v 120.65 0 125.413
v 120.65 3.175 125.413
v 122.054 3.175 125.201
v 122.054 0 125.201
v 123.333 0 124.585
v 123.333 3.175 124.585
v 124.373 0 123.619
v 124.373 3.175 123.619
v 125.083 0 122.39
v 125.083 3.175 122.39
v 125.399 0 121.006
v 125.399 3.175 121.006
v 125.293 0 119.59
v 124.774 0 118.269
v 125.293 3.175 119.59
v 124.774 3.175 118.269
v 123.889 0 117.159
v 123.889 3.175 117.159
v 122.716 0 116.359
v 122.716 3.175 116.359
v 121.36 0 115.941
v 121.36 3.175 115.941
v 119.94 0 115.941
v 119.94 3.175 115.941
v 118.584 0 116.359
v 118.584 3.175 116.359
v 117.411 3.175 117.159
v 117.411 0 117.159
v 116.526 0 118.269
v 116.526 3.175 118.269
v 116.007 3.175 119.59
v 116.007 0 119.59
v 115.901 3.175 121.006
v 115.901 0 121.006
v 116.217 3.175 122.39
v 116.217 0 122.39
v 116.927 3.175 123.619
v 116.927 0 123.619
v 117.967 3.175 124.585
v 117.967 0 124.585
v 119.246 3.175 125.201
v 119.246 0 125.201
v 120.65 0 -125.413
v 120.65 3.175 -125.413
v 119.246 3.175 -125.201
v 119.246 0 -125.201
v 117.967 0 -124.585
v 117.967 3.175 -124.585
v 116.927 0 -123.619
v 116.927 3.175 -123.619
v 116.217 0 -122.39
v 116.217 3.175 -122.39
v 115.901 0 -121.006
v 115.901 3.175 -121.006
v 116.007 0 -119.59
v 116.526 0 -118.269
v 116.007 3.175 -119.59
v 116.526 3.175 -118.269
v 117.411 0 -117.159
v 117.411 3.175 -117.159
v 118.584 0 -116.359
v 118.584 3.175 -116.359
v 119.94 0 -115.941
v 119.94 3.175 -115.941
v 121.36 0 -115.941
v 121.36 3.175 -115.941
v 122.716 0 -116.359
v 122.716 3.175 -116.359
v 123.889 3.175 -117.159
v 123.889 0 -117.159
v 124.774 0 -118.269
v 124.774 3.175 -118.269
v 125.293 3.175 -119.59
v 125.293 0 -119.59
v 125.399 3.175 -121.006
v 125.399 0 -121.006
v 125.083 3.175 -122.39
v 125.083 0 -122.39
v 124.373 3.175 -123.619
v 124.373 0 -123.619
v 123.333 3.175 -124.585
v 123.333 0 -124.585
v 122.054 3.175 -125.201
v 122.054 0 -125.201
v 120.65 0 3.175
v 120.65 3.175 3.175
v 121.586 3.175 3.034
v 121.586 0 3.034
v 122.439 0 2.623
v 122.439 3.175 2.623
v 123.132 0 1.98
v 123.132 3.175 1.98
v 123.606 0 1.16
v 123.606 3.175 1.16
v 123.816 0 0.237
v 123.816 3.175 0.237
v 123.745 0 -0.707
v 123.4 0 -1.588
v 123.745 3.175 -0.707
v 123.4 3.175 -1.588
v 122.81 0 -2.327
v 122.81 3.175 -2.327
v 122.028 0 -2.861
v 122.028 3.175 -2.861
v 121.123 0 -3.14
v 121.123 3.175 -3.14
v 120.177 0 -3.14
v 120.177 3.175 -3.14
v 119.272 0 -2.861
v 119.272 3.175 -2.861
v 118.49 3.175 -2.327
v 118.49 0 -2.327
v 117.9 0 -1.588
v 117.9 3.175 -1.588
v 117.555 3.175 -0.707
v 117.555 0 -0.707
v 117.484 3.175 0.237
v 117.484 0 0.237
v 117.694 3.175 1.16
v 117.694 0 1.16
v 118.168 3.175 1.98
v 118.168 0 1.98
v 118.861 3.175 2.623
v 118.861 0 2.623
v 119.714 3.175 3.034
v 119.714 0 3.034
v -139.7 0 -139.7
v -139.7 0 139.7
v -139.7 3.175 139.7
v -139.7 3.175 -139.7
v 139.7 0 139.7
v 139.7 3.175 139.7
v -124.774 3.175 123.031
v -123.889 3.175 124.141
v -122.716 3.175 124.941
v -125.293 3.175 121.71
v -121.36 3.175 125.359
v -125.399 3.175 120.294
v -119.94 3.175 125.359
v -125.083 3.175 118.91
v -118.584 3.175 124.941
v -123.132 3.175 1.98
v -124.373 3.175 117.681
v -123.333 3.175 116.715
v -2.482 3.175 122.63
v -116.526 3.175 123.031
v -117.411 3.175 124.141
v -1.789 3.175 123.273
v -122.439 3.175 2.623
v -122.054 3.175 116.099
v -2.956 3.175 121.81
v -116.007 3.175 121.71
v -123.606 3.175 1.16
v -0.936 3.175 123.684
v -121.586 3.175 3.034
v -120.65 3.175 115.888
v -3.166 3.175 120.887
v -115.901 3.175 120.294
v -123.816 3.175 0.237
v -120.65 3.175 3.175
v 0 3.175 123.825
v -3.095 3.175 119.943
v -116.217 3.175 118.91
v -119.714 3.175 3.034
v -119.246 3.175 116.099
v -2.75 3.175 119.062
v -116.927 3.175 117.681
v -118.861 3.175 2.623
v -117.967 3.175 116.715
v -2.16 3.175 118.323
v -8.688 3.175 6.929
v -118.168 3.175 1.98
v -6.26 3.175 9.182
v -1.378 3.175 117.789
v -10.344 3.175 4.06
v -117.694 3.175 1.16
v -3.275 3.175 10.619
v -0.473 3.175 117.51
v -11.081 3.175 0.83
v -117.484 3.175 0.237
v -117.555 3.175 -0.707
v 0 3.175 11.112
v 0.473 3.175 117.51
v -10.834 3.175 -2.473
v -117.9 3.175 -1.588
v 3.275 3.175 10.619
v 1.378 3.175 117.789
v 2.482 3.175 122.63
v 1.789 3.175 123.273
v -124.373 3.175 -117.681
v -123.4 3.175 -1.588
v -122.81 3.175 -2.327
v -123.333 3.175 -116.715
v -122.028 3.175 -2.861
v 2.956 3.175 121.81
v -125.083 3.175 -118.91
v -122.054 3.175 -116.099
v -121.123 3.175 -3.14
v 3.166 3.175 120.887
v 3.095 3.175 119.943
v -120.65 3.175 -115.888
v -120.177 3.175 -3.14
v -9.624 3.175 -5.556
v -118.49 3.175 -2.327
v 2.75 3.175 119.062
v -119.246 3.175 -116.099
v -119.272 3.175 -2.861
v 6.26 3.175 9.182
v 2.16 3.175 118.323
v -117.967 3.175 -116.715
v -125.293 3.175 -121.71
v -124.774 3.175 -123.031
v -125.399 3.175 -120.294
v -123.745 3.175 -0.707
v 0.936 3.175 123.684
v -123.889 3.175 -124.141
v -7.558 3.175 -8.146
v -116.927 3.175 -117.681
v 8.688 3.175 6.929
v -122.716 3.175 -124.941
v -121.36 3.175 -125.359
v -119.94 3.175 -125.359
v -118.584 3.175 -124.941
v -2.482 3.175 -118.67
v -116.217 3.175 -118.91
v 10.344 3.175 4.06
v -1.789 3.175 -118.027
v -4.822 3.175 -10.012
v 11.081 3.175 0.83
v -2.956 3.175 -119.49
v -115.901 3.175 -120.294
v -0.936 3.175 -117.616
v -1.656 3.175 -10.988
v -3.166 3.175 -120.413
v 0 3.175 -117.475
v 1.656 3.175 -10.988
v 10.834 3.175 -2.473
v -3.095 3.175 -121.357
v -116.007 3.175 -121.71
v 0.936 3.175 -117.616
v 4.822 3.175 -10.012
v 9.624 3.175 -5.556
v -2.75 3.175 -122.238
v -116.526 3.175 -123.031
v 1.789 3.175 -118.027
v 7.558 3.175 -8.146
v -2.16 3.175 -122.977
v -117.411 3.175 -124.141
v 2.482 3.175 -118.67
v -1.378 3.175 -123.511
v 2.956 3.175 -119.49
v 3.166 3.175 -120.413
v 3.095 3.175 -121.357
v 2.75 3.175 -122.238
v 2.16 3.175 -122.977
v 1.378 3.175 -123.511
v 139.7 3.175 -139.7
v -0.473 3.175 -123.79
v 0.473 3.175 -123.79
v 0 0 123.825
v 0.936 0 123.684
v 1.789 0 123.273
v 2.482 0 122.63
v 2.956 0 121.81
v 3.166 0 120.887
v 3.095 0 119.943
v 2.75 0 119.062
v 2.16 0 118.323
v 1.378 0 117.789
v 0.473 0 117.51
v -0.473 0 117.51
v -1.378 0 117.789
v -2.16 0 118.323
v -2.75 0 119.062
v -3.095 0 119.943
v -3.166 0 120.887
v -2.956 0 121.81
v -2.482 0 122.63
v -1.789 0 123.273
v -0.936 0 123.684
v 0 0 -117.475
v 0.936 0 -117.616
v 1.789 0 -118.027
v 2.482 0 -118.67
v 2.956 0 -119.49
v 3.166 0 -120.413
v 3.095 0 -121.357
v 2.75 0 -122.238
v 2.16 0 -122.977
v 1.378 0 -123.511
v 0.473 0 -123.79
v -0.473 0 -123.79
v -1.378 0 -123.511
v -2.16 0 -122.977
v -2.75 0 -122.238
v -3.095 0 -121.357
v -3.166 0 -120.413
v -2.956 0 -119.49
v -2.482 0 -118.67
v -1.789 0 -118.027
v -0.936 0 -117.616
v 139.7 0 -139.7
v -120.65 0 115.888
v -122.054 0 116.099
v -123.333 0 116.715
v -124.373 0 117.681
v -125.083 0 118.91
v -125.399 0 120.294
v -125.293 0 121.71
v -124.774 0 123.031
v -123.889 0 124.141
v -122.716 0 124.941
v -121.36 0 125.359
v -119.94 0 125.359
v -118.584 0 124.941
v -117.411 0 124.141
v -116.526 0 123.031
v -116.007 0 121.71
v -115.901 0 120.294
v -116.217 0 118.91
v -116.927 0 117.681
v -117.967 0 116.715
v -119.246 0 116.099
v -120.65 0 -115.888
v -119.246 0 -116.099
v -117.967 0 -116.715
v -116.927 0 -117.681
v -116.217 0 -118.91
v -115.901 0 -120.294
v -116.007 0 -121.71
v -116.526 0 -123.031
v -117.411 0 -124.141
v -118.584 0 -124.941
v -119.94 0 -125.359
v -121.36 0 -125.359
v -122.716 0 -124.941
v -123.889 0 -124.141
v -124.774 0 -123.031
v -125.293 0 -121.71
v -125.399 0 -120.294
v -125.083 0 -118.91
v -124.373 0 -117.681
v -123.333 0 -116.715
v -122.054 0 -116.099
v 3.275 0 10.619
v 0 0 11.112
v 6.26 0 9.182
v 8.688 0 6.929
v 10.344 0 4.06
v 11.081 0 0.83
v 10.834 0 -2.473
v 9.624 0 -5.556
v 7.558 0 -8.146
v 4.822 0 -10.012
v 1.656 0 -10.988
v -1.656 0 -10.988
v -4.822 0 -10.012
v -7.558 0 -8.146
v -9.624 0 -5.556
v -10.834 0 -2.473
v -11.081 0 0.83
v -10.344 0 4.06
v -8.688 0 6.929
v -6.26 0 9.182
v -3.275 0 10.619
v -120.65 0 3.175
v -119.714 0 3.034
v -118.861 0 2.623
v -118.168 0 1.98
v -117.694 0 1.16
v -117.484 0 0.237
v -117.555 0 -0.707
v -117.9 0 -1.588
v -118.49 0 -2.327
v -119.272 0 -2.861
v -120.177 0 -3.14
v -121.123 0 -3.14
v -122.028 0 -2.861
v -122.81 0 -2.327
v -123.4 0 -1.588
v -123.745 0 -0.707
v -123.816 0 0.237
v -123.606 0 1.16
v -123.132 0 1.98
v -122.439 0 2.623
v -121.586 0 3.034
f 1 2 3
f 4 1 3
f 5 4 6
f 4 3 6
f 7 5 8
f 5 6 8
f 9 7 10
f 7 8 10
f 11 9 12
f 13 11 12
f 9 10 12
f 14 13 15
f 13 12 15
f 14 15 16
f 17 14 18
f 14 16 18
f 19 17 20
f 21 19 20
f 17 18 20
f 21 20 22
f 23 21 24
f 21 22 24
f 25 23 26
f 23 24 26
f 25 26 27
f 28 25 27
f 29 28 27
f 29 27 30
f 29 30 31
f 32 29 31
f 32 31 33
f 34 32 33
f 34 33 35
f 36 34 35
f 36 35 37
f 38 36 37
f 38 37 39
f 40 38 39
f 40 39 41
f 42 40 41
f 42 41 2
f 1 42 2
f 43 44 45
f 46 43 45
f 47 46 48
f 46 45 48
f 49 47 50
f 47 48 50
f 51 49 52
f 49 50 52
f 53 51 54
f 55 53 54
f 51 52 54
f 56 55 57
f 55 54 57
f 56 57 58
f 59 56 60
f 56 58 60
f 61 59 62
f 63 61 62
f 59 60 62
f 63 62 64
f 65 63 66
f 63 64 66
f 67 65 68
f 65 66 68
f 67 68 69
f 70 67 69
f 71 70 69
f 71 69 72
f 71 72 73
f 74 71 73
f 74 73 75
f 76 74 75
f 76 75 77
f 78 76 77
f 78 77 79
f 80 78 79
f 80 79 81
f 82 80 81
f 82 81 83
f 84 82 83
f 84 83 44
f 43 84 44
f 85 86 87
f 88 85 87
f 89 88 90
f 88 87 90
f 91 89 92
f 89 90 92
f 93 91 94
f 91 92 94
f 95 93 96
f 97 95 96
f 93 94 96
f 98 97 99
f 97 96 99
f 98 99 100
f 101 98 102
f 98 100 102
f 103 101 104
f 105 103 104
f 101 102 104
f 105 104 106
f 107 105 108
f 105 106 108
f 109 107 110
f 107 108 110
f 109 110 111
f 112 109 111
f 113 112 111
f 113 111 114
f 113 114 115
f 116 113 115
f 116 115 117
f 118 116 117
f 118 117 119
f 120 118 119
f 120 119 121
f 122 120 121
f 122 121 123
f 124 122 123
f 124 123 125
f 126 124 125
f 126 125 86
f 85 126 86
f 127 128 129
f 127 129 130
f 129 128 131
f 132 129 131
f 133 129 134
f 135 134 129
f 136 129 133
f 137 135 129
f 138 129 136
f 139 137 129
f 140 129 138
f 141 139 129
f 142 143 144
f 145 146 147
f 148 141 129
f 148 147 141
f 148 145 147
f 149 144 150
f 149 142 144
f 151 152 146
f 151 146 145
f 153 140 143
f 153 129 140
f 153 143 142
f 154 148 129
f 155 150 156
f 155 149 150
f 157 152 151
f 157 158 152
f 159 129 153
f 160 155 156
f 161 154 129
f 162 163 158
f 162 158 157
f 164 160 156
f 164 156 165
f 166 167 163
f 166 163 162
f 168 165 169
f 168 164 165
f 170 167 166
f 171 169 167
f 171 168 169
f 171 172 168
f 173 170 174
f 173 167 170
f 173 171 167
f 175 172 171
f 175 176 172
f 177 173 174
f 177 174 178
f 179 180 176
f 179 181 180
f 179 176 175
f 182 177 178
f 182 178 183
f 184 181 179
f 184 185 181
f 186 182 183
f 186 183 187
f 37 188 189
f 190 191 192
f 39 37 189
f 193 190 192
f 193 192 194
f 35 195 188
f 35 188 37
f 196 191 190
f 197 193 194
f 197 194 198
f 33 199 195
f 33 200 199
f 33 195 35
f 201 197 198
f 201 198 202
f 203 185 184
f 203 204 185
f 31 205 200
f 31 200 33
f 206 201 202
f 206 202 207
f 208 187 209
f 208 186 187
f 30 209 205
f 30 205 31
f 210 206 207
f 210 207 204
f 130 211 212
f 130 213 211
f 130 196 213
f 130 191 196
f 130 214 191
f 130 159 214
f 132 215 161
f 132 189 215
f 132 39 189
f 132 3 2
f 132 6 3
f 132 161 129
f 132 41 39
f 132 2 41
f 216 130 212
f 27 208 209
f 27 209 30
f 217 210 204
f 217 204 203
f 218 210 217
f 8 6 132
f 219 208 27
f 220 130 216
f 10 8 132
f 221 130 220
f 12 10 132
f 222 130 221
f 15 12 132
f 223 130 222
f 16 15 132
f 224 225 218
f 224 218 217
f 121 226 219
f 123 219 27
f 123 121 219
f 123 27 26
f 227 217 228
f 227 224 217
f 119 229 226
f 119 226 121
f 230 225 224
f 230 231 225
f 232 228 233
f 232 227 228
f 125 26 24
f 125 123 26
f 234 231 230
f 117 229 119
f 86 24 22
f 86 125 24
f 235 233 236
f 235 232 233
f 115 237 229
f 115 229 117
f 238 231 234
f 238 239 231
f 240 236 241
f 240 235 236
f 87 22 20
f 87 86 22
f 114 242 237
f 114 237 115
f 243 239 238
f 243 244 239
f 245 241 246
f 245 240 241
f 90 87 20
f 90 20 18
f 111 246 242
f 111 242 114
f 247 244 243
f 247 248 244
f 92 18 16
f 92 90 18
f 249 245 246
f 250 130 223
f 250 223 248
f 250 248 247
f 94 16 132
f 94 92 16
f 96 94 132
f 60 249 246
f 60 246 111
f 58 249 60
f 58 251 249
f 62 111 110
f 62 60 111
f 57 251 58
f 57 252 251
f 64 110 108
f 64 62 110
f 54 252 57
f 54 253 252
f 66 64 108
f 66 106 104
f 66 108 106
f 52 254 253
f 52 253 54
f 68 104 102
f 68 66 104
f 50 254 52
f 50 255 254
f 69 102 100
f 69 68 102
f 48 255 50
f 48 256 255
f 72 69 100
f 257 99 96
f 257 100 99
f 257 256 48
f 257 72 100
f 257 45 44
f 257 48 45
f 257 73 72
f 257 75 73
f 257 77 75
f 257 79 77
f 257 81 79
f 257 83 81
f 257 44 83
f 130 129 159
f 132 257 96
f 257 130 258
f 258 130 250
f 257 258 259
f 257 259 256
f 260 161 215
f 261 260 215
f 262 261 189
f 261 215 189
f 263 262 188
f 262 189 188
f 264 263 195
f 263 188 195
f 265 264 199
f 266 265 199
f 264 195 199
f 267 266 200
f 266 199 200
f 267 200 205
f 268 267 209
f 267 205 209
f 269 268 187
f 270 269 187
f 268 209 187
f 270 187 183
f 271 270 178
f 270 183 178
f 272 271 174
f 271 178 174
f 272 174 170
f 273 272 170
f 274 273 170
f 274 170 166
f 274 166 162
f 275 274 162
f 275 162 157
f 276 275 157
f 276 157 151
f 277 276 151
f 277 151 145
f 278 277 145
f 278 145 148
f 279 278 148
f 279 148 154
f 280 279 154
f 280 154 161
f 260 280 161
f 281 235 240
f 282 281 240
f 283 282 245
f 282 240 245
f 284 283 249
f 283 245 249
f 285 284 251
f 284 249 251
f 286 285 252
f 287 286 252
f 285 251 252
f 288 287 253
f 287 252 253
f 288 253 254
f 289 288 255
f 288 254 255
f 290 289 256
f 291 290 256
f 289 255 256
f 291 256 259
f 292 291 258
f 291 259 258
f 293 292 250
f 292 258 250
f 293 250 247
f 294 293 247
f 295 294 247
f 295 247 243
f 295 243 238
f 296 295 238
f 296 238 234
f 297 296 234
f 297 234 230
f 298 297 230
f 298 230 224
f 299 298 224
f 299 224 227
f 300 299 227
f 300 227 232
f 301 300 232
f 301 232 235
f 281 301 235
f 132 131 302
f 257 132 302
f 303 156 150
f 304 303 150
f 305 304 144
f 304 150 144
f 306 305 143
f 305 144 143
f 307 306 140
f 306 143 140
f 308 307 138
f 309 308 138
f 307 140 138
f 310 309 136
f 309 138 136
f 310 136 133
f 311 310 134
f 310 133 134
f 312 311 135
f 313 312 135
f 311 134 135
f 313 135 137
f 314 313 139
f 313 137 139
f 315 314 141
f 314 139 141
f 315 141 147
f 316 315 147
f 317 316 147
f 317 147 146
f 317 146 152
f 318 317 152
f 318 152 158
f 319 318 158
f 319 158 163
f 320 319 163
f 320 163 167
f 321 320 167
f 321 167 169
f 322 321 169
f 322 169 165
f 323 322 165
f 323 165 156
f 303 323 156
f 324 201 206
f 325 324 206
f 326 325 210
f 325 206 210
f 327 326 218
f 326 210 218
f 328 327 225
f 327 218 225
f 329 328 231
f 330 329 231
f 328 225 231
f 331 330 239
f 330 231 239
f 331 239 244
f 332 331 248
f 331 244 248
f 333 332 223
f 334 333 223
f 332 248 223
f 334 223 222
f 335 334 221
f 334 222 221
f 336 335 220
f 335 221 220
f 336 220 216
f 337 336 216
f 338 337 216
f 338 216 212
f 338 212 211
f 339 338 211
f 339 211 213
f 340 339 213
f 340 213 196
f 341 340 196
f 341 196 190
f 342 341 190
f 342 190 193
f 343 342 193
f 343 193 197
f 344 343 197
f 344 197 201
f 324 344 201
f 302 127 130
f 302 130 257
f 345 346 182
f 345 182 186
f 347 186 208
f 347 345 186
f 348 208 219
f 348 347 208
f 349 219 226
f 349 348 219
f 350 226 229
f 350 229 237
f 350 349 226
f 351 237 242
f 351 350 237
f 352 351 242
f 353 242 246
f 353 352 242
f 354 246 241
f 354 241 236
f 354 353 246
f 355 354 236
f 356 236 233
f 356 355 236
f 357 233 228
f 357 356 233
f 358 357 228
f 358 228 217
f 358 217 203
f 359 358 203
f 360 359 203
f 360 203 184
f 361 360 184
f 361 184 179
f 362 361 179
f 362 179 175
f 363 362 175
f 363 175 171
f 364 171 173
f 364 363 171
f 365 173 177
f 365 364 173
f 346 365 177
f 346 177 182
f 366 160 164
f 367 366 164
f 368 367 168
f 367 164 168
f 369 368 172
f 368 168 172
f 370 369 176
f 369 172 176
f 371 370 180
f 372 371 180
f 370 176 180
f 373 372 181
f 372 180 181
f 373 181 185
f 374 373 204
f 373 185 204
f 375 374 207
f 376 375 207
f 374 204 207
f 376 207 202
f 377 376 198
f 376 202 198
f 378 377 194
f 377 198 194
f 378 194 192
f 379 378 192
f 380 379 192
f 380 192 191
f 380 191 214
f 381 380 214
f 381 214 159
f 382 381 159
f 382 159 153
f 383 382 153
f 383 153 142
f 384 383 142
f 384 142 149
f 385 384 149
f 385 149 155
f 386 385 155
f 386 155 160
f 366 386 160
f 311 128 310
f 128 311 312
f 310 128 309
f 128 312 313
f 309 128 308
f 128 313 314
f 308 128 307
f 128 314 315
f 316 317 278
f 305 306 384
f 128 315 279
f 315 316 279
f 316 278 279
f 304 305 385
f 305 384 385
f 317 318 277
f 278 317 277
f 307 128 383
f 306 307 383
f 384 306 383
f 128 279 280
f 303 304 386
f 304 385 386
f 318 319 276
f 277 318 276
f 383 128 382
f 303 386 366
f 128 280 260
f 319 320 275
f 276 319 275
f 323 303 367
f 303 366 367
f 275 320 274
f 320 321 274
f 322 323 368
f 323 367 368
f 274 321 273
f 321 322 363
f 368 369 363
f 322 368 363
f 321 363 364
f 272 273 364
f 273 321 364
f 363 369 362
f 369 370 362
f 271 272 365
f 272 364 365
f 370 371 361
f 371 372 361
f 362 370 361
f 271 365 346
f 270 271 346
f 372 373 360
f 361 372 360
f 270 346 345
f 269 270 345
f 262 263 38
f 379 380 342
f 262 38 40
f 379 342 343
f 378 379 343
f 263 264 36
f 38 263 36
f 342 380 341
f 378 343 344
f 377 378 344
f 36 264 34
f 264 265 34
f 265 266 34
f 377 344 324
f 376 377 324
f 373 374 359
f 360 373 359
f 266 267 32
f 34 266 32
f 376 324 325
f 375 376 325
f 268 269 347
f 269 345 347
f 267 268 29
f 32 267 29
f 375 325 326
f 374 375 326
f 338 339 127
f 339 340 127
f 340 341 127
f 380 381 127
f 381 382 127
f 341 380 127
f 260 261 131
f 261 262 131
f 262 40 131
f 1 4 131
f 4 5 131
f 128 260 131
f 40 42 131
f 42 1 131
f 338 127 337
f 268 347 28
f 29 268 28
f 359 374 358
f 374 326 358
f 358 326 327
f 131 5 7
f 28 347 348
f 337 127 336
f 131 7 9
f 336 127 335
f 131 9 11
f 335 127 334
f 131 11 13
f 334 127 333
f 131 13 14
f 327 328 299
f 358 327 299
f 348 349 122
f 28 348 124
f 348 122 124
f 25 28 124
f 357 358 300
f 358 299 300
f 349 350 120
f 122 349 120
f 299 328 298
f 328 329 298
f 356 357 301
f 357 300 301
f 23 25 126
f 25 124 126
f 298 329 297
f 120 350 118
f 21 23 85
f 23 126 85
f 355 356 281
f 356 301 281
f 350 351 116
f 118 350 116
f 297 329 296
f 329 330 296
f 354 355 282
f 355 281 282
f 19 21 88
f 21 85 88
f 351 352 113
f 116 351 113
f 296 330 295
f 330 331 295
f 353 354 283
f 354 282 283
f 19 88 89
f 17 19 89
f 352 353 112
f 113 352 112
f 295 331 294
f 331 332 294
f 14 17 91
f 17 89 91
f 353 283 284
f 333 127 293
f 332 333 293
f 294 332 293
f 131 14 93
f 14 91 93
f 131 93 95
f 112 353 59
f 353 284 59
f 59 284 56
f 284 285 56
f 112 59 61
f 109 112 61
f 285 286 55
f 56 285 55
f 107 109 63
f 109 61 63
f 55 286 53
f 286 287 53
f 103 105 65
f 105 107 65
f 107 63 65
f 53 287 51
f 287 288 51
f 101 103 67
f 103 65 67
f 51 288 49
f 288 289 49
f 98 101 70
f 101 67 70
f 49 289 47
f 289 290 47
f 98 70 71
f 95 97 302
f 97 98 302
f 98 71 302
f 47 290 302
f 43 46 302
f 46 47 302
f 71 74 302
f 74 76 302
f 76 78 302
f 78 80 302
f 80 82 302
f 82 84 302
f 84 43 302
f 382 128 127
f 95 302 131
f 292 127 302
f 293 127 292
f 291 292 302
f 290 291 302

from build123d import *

# Parameters (mm, degrees)
SKETCH1_W           = 279.4
SKETCH1_H           = 279.4
SKETCH1_R           = 11.1125
BOSS_EXTRUDE1_DEPTH = 3.175
SKETCH2_R           = 3.175
SKETCH2_R_2         = 4.7625
CUT_EXTRUDE1_DEPTH  = 198.591145108


with BuildPart() as part:
    # Sketch1 → Boss-Extrude1 (new body)
    with BuildSketch(Plane(origin=(0, 0, 0), x_dir=(1, 0, 0), z_dir=(0, 1, 0))):
        Rectangle(SKETCH1_W, SKETCH1_H)
        with Locations(Location((0, 0, 0), (0, 0, 270))):
            Circle(SKETCH1_R, mode=Mode.SUBTRACT)
    extrude(amount=BOSS_EXTRUDE1_DEPTH)

    # Sketch2 → Cut-Extrude1 (cut, through all)
    with BuildSketch(Plane(origin=(0, 3.175, 0), x_dir=(1, 0, 0), z_dir=(0, 1, 0))):
        with Locations(Location((0, 120.65, 0), (0, 0, 270))):
            Circle(SKETCH2_R)
        with Locations(Location((120.65, 0, 0), (0, 0, 270))):
            Circle(SKETCH2_R)
        with Locations(Location((0, -120.65, 0), (0, 0, 270))):
            Circle(SKETCH2_R)
        with Locations(Location((-120.65, 0, 0), (0, 0, 270))):
            Circle(SKETCH2_R)
        with Locations(Location((-120.65, 120.65, 0), (0, 0, 270))):
            Circle(SKETCH2_R_2)
        with Locations(Location((120.65, 120.65, 0), (0, 0, 90))):
            Circle(SKETCH2_R_2)
        with Locations(Location((-120.65, -120.65, 0), (0, 0, 90))):
            Circle(SKETCH2_R_2)
        with Locations(Location((120.65, -120.65, 0), (0, 0, 270))):
            Circle(SKETCH2_R_2)
    extrude(amount=-CUT_EXTRUDE1_DEPTH, mode=Mode.SUBTRACT)


solid = part.part
